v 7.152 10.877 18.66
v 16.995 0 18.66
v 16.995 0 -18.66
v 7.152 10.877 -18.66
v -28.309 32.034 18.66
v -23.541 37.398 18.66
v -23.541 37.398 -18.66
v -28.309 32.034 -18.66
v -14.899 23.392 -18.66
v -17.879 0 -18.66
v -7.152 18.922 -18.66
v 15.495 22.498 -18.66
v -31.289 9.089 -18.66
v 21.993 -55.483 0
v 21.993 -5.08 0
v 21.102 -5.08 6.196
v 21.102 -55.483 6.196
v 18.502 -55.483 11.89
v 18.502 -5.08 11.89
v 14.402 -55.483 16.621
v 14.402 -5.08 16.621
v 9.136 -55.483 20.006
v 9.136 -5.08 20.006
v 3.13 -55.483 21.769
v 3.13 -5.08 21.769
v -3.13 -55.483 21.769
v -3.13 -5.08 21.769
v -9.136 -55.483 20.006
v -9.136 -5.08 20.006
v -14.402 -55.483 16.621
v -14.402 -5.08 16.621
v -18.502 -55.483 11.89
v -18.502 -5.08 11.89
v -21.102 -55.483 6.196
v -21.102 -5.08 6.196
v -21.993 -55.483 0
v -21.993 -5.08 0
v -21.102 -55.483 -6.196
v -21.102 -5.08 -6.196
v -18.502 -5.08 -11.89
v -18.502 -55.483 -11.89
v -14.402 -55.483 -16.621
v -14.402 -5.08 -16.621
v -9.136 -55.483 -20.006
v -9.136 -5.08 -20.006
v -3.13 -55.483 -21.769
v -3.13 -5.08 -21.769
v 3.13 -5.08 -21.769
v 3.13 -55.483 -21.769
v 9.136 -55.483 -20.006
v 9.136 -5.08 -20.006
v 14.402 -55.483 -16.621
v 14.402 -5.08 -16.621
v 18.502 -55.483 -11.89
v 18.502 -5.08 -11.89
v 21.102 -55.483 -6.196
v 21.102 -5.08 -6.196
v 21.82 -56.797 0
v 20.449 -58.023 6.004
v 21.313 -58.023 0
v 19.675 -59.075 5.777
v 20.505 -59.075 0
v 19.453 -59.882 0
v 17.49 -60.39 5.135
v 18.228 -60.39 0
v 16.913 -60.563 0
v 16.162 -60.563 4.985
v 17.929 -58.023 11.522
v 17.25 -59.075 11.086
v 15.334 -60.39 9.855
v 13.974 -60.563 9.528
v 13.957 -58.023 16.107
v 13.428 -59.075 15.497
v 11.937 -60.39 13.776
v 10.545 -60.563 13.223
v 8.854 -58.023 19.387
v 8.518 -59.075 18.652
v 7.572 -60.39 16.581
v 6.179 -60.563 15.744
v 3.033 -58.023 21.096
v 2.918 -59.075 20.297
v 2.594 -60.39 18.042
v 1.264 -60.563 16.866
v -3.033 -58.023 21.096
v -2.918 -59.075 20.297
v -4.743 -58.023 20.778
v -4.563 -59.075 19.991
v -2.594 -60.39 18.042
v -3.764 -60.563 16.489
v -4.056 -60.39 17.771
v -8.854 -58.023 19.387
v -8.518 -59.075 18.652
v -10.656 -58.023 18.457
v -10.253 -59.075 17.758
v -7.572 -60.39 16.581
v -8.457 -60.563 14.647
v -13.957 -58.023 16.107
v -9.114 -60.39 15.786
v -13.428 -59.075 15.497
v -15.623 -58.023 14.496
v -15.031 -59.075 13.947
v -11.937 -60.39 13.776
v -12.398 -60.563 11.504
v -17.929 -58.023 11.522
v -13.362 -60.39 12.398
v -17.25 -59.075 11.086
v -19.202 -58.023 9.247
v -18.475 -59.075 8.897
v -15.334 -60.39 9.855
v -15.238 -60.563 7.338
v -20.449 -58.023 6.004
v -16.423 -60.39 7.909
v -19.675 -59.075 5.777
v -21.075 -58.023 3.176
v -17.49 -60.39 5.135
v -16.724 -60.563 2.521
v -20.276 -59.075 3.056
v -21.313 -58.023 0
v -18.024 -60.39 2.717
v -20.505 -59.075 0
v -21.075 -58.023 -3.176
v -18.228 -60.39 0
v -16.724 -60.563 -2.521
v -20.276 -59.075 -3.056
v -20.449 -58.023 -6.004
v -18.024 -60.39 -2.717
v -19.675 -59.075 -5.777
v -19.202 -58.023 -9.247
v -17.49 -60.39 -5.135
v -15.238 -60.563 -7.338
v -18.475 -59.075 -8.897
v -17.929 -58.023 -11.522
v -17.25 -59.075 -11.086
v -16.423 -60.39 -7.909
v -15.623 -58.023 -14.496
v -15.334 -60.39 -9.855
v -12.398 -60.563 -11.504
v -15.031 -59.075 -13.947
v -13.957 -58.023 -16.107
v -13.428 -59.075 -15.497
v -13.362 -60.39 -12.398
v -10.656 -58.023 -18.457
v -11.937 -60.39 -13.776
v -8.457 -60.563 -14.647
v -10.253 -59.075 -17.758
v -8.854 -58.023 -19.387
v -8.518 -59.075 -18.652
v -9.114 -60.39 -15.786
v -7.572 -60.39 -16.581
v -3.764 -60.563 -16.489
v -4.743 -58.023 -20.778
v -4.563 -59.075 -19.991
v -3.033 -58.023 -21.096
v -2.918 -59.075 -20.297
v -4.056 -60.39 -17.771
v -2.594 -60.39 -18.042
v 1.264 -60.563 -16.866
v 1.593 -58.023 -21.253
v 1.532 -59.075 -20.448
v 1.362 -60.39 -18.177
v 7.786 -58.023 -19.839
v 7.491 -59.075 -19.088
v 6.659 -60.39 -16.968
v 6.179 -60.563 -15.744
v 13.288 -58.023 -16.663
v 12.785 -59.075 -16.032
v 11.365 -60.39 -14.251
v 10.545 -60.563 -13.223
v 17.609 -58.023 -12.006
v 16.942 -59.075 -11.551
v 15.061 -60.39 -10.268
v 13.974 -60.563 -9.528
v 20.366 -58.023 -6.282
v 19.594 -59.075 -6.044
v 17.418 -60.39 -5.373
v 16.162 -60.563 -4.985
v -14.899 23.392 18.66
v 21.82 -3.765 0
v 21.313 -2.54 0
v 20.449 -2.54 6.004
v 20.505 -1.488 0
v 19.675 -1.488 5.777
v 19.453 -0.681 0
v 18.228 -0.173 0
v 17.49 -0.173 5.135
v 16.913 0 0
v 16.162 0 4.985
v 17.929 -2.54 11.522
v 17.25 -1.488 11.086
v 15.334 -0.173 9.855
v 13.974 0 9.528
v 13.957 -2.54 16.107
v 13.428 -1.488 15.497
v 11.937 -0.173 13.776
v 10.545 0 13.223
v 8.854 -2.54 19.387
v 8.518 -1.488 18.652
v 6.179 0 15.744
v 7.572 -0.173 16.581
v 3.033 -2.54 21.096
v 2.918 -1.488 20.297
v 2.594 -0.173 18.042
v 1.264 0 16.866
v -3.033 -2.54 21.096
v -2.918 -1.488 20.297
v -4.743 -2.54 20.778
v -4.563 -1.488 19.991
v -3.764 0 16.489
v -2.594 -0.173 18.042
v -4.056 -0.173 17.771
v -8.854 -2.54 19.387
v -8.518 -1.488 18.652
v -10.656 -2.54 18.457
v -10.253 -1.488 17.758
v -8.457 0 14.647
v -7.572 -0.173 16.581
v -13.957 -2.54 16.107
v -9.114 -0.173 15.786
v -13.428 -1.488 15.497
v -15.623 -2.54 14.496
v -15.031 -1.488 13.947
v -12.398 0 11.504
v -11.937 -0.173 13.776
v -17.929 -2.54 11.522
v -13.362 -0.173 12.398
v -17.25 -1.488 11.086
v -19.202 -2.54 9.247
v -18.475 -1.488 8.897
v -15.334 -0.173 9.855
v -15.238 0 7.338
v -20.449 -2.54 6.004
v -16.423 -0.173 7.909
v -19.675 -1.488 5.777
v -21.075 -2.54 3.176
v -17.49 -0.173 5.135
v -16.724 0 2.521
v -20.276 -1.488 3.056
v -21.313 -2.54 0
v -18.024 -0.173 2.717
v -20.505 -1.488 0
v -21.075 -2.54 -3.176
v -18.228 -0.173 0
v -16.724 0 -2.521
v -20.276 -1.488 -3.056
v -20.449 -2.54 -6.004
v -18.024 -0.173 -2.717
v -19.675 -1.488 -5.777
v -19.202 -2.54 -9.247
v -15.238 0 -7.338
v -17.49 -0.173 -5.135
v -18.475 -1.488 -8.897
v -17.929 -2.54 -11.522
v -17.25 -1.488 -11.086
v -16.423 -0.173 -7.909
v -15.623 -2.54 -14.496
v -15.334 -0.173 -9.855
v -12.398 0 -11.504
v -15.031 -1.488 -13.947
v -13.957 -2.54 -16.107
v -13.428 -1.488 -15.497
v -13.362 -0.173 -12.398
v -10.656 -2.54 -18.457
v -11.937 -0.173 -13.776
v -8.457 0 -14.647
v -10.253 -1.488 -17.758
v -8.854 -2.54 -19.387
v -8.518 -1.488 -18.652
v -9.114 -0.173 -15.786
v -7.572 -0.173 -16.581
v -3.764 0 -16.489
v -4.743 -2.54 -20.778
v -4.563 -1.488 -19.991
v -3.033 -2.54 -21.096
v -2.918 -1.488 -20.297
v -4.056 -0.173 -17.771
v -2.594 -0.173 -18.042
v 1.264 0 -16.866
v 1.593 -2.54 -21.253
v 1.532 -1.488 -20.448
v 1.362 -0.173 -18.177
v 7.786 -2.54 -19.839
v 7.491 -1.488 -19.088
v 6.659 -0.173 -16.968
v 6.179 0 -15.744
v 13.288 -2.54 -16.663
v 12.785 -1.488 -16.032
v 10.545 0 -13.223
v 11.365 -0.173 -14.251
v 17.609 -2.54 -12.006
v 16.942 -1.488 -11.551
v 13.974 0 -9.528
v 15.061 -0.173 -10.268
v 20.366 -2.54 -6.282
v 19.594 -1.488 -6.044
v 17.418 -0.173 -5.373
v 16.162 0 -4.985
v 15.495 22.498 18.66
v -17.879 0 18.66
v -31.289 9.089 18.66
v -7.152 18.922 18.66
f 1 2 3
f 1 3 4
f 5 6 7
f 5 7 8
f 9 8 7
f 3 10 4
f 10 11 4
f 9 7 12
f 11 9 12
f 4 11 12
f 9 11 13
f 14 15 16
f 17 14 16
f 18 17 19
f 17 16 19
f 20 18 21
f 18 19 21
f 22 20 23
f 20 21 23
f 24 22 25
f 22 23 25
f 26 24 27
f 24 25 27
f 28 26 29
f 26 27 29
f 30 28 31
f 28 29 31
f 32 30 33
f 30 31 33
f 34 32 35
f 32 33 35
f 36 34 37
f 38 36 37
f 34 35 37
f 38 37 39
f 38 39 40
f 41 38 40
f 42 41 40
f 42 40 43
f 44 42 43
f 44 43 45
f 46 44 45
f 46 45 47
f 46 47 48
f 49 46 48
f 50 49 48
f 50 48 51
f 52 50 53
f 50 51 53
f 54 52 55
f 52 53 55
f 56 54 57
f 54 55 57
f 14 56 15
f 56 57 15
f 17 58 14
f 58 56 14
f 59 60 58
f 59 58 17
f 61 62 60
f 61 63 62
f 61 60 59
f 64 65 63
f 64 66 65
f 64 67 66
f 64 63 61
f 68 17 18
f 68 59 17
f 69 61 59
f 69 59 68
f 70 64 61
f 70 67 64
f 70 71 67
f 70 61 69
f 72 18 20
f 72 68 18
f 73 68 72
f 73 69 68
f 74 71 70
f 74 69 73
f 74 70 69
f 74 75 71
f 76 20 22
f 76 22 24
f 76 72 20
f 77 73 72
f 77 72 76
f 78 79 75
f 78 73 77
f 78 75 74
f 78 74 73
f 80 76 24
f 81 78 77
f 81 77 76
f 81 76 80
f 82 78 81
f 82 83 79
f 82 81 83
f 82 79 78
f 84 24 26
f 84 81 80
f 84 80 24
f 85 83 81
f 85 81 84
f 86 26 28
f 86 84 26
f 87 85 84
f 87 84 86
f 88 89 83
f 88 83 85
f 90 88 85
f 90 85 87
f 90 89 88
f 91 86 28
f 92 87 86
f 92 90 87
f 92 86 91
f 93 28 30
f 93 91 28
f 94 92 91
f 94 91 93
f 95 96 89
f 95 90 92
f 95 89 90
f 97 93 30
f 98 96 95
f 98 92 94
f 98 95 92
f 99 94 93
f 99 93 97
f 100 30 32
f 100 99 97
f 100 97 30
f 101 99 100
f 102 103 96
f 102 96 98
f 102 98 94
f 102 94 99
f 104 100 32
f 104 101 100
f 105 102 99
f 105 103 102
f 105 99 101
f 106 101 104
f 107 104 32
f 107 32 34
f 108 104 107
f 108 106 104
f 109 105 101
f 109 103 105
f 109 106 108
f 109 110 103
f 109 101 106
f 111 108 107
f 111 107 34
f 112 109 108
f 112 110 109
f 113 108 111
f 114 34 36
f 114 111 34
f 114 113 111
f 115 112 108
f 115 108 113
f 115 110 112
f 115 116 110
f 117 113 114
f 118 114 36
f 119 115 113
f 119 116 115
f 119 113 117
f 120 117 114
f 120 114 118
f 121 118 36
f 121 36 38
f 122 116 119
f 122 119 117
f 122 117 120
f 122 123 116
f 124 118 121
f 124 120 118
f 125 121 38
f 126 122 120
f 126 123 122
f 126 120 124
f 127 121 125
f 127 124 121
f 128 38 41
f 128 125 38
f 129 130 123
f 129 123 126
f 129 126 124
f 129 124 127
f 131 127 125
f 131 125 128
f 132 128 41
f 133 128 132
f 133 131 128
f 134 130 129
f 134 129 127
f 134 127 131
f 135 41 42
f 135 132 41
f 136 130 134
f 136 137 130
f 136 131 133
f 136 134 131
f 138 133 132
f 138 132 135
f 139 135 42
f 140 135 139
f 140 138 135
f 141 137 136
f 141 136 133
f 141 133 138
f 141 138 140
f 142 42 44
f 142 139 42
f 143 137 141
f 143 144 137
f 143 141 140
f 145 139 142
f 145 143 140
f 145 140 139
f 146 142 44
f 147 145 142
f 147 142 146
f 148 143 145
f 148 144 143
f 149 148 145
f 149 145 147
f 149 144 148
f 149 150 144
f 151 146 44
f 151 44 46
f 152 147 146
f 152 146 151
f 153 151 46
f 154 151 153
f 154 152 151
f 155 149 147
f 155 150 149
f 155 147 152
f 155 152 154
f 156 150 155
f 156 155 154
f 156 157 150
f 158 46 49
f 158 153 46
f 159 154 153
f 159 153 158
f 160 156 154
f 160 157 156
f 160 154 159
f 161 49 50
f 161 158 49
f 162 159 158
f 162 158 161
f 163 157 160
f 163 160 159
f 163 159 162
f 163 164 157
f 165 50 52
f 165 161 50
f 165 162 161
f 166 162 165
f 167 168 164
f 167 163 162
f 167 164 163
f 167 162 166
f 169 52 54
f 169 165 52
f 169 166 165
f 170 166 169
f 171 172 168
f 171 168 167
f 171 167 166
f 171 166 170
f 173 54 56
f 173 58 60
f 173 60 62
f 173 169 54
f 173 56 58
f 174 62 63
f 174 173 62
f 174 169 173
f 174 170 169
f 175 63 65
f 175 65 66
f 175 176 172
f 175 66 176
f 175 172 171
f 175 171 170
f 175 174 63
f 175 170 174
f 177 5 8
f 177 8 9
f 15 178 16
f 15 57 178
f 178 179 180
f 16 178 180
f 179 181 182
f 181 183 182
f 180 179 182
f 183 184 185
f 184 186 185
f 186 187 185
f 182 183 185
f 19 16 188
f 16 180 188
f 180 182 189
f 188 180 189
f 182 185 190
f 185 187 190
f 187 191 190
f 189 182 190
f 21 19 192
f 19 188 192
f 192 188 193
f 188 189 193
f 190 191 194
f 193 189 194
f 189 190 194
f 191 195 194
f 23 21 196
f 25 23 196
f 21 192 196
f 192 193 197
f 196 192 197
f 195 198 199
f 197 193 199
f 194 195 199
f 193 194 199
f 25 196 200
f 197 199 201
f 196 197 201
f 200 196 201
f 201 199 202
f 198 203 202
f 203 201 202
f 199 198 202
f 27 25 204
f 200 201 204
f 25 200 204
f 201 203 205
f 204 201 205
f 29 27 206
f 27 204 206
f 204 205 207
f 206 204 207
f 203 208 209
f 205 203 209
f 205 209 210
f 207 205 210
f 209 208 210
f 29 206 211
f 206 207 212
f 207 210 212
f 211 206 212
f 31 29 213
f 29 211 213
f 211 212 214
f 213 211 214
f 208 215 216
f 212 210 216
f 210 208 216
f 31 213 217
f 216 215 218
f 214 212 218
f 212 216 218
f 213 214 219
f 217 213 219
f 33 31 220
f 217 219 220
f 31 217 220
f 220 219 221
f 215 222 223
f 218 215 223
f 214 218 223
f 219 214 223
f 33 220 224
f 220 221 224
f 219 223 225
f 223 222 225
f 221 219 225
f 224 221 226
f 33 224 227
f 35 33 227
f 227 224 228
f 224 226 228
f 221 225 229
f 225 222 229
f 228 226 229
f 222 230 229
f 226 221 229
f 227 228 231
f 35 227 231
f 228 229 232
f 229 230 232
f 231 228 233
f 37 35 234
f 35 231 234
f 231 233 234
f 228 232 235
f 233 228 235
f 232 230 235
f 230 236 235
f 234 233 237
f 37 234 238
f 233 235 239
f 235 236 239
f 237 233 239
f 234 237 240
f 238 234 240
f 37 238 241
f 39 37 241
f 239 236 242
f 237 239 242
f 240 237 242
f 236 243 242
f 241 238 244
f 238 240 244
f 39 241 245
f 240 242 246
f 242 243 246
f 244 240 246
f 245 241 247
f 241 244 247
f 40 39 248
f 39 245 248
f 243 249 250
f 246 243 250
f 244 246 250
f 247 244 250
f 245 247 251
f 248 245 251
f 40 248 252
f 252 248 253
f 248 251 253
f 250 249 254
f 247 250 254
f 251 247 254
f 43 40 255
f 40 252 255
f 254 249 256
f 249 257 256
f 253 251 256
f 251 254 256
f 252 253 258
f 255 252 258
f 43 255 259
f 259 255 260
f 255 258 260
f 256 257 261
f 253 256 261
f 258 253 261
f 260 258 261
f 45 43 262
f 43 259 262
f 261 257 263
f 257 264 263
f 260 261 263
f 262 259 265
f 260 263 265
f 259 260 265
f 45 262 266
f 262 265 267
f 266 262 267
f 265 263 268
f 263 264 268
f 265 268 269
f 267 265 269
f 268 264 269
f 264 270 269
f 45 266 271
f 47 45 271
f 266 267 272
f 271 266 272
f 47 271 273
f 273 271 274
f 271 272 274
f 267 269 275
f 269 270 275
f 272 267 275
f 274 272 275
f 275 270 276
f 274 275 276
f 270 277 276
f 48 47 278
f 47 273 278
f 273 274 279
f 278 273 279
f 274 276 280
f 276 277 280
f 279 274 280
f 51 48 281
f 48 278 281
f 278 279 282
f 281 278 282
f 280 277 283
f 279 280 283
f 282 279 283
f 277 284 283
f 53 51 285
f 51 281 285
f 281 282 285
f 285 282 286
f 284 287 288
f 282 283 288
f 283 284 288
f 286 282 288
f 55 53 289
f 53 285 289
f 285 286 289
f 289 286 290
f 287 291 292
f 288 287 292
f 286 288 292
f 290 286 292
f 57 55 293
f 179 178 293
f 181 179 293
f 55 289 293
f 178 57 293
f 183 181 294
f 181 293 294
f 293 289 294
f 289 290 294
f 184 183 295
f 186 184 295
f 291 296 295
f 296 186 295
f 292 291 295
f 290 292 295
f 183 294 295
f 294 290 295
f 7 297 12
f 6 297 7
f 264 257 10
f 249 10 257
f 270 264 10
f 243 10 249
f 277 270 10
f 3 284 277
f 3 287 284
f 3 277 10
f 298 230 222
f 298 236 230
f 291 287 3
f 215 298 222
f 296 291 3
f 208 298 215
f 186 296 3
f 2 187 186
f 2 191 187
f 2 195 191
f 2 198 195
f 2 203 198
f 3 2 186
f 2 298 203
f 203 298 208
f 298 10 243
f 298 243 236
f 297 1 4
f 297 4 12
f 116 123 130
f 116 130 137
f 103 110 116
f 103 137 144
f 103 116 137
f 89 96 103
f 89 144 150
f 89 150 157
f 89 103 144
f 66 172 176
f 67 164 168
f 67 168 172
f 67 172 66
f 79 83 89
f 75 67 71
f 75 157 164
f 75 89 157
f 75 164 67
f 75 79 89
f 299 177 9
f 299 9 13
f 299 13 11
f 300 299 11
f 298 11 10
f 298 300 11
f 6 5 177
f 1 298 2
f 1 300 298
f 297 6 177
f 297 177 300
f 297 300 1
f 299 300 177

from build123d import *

# Parameters (mm, degrees)
F0_R     = 21.993212
F1_DEPTH = 60.56268
F2_R     = 5.08
F4_DEPTH = 18.65978


with BuildPart() as f1:
    # F0 (on Front) → F1 (new body)
    with BuildSketch(Plane.XZ):
        Circle(F0_R)
    extrude(amount=F1_DEPTH)

    # F2
    f2_edges = [f1.edges().sort_by_distance(p)[0] for p in [
        (21.993212, -30.28134, 0),
        (-21.993212, 0, 0),
        (-21.993212, -60.56268, 0),
    ]]
    fillet(f2_edges, radius=F2_R)

    # F3 (on Top) → F4 (join, symmetric)
    with BuildSketch(Plane.XY):
        Polygon((-17.87933, 0), (16.99487, 0), (7.151732, 10.876591), (15.49542, 22.498155), (-23.541117, 37.397597), (-28.308937, 32.033801), (-14.899442, 23.392122), (-31.288829, 9.08866), (-7.151735, 18.922292), align=None)
    extrude(amount=F4_DEPTH, both=True)


solid = f1.part
